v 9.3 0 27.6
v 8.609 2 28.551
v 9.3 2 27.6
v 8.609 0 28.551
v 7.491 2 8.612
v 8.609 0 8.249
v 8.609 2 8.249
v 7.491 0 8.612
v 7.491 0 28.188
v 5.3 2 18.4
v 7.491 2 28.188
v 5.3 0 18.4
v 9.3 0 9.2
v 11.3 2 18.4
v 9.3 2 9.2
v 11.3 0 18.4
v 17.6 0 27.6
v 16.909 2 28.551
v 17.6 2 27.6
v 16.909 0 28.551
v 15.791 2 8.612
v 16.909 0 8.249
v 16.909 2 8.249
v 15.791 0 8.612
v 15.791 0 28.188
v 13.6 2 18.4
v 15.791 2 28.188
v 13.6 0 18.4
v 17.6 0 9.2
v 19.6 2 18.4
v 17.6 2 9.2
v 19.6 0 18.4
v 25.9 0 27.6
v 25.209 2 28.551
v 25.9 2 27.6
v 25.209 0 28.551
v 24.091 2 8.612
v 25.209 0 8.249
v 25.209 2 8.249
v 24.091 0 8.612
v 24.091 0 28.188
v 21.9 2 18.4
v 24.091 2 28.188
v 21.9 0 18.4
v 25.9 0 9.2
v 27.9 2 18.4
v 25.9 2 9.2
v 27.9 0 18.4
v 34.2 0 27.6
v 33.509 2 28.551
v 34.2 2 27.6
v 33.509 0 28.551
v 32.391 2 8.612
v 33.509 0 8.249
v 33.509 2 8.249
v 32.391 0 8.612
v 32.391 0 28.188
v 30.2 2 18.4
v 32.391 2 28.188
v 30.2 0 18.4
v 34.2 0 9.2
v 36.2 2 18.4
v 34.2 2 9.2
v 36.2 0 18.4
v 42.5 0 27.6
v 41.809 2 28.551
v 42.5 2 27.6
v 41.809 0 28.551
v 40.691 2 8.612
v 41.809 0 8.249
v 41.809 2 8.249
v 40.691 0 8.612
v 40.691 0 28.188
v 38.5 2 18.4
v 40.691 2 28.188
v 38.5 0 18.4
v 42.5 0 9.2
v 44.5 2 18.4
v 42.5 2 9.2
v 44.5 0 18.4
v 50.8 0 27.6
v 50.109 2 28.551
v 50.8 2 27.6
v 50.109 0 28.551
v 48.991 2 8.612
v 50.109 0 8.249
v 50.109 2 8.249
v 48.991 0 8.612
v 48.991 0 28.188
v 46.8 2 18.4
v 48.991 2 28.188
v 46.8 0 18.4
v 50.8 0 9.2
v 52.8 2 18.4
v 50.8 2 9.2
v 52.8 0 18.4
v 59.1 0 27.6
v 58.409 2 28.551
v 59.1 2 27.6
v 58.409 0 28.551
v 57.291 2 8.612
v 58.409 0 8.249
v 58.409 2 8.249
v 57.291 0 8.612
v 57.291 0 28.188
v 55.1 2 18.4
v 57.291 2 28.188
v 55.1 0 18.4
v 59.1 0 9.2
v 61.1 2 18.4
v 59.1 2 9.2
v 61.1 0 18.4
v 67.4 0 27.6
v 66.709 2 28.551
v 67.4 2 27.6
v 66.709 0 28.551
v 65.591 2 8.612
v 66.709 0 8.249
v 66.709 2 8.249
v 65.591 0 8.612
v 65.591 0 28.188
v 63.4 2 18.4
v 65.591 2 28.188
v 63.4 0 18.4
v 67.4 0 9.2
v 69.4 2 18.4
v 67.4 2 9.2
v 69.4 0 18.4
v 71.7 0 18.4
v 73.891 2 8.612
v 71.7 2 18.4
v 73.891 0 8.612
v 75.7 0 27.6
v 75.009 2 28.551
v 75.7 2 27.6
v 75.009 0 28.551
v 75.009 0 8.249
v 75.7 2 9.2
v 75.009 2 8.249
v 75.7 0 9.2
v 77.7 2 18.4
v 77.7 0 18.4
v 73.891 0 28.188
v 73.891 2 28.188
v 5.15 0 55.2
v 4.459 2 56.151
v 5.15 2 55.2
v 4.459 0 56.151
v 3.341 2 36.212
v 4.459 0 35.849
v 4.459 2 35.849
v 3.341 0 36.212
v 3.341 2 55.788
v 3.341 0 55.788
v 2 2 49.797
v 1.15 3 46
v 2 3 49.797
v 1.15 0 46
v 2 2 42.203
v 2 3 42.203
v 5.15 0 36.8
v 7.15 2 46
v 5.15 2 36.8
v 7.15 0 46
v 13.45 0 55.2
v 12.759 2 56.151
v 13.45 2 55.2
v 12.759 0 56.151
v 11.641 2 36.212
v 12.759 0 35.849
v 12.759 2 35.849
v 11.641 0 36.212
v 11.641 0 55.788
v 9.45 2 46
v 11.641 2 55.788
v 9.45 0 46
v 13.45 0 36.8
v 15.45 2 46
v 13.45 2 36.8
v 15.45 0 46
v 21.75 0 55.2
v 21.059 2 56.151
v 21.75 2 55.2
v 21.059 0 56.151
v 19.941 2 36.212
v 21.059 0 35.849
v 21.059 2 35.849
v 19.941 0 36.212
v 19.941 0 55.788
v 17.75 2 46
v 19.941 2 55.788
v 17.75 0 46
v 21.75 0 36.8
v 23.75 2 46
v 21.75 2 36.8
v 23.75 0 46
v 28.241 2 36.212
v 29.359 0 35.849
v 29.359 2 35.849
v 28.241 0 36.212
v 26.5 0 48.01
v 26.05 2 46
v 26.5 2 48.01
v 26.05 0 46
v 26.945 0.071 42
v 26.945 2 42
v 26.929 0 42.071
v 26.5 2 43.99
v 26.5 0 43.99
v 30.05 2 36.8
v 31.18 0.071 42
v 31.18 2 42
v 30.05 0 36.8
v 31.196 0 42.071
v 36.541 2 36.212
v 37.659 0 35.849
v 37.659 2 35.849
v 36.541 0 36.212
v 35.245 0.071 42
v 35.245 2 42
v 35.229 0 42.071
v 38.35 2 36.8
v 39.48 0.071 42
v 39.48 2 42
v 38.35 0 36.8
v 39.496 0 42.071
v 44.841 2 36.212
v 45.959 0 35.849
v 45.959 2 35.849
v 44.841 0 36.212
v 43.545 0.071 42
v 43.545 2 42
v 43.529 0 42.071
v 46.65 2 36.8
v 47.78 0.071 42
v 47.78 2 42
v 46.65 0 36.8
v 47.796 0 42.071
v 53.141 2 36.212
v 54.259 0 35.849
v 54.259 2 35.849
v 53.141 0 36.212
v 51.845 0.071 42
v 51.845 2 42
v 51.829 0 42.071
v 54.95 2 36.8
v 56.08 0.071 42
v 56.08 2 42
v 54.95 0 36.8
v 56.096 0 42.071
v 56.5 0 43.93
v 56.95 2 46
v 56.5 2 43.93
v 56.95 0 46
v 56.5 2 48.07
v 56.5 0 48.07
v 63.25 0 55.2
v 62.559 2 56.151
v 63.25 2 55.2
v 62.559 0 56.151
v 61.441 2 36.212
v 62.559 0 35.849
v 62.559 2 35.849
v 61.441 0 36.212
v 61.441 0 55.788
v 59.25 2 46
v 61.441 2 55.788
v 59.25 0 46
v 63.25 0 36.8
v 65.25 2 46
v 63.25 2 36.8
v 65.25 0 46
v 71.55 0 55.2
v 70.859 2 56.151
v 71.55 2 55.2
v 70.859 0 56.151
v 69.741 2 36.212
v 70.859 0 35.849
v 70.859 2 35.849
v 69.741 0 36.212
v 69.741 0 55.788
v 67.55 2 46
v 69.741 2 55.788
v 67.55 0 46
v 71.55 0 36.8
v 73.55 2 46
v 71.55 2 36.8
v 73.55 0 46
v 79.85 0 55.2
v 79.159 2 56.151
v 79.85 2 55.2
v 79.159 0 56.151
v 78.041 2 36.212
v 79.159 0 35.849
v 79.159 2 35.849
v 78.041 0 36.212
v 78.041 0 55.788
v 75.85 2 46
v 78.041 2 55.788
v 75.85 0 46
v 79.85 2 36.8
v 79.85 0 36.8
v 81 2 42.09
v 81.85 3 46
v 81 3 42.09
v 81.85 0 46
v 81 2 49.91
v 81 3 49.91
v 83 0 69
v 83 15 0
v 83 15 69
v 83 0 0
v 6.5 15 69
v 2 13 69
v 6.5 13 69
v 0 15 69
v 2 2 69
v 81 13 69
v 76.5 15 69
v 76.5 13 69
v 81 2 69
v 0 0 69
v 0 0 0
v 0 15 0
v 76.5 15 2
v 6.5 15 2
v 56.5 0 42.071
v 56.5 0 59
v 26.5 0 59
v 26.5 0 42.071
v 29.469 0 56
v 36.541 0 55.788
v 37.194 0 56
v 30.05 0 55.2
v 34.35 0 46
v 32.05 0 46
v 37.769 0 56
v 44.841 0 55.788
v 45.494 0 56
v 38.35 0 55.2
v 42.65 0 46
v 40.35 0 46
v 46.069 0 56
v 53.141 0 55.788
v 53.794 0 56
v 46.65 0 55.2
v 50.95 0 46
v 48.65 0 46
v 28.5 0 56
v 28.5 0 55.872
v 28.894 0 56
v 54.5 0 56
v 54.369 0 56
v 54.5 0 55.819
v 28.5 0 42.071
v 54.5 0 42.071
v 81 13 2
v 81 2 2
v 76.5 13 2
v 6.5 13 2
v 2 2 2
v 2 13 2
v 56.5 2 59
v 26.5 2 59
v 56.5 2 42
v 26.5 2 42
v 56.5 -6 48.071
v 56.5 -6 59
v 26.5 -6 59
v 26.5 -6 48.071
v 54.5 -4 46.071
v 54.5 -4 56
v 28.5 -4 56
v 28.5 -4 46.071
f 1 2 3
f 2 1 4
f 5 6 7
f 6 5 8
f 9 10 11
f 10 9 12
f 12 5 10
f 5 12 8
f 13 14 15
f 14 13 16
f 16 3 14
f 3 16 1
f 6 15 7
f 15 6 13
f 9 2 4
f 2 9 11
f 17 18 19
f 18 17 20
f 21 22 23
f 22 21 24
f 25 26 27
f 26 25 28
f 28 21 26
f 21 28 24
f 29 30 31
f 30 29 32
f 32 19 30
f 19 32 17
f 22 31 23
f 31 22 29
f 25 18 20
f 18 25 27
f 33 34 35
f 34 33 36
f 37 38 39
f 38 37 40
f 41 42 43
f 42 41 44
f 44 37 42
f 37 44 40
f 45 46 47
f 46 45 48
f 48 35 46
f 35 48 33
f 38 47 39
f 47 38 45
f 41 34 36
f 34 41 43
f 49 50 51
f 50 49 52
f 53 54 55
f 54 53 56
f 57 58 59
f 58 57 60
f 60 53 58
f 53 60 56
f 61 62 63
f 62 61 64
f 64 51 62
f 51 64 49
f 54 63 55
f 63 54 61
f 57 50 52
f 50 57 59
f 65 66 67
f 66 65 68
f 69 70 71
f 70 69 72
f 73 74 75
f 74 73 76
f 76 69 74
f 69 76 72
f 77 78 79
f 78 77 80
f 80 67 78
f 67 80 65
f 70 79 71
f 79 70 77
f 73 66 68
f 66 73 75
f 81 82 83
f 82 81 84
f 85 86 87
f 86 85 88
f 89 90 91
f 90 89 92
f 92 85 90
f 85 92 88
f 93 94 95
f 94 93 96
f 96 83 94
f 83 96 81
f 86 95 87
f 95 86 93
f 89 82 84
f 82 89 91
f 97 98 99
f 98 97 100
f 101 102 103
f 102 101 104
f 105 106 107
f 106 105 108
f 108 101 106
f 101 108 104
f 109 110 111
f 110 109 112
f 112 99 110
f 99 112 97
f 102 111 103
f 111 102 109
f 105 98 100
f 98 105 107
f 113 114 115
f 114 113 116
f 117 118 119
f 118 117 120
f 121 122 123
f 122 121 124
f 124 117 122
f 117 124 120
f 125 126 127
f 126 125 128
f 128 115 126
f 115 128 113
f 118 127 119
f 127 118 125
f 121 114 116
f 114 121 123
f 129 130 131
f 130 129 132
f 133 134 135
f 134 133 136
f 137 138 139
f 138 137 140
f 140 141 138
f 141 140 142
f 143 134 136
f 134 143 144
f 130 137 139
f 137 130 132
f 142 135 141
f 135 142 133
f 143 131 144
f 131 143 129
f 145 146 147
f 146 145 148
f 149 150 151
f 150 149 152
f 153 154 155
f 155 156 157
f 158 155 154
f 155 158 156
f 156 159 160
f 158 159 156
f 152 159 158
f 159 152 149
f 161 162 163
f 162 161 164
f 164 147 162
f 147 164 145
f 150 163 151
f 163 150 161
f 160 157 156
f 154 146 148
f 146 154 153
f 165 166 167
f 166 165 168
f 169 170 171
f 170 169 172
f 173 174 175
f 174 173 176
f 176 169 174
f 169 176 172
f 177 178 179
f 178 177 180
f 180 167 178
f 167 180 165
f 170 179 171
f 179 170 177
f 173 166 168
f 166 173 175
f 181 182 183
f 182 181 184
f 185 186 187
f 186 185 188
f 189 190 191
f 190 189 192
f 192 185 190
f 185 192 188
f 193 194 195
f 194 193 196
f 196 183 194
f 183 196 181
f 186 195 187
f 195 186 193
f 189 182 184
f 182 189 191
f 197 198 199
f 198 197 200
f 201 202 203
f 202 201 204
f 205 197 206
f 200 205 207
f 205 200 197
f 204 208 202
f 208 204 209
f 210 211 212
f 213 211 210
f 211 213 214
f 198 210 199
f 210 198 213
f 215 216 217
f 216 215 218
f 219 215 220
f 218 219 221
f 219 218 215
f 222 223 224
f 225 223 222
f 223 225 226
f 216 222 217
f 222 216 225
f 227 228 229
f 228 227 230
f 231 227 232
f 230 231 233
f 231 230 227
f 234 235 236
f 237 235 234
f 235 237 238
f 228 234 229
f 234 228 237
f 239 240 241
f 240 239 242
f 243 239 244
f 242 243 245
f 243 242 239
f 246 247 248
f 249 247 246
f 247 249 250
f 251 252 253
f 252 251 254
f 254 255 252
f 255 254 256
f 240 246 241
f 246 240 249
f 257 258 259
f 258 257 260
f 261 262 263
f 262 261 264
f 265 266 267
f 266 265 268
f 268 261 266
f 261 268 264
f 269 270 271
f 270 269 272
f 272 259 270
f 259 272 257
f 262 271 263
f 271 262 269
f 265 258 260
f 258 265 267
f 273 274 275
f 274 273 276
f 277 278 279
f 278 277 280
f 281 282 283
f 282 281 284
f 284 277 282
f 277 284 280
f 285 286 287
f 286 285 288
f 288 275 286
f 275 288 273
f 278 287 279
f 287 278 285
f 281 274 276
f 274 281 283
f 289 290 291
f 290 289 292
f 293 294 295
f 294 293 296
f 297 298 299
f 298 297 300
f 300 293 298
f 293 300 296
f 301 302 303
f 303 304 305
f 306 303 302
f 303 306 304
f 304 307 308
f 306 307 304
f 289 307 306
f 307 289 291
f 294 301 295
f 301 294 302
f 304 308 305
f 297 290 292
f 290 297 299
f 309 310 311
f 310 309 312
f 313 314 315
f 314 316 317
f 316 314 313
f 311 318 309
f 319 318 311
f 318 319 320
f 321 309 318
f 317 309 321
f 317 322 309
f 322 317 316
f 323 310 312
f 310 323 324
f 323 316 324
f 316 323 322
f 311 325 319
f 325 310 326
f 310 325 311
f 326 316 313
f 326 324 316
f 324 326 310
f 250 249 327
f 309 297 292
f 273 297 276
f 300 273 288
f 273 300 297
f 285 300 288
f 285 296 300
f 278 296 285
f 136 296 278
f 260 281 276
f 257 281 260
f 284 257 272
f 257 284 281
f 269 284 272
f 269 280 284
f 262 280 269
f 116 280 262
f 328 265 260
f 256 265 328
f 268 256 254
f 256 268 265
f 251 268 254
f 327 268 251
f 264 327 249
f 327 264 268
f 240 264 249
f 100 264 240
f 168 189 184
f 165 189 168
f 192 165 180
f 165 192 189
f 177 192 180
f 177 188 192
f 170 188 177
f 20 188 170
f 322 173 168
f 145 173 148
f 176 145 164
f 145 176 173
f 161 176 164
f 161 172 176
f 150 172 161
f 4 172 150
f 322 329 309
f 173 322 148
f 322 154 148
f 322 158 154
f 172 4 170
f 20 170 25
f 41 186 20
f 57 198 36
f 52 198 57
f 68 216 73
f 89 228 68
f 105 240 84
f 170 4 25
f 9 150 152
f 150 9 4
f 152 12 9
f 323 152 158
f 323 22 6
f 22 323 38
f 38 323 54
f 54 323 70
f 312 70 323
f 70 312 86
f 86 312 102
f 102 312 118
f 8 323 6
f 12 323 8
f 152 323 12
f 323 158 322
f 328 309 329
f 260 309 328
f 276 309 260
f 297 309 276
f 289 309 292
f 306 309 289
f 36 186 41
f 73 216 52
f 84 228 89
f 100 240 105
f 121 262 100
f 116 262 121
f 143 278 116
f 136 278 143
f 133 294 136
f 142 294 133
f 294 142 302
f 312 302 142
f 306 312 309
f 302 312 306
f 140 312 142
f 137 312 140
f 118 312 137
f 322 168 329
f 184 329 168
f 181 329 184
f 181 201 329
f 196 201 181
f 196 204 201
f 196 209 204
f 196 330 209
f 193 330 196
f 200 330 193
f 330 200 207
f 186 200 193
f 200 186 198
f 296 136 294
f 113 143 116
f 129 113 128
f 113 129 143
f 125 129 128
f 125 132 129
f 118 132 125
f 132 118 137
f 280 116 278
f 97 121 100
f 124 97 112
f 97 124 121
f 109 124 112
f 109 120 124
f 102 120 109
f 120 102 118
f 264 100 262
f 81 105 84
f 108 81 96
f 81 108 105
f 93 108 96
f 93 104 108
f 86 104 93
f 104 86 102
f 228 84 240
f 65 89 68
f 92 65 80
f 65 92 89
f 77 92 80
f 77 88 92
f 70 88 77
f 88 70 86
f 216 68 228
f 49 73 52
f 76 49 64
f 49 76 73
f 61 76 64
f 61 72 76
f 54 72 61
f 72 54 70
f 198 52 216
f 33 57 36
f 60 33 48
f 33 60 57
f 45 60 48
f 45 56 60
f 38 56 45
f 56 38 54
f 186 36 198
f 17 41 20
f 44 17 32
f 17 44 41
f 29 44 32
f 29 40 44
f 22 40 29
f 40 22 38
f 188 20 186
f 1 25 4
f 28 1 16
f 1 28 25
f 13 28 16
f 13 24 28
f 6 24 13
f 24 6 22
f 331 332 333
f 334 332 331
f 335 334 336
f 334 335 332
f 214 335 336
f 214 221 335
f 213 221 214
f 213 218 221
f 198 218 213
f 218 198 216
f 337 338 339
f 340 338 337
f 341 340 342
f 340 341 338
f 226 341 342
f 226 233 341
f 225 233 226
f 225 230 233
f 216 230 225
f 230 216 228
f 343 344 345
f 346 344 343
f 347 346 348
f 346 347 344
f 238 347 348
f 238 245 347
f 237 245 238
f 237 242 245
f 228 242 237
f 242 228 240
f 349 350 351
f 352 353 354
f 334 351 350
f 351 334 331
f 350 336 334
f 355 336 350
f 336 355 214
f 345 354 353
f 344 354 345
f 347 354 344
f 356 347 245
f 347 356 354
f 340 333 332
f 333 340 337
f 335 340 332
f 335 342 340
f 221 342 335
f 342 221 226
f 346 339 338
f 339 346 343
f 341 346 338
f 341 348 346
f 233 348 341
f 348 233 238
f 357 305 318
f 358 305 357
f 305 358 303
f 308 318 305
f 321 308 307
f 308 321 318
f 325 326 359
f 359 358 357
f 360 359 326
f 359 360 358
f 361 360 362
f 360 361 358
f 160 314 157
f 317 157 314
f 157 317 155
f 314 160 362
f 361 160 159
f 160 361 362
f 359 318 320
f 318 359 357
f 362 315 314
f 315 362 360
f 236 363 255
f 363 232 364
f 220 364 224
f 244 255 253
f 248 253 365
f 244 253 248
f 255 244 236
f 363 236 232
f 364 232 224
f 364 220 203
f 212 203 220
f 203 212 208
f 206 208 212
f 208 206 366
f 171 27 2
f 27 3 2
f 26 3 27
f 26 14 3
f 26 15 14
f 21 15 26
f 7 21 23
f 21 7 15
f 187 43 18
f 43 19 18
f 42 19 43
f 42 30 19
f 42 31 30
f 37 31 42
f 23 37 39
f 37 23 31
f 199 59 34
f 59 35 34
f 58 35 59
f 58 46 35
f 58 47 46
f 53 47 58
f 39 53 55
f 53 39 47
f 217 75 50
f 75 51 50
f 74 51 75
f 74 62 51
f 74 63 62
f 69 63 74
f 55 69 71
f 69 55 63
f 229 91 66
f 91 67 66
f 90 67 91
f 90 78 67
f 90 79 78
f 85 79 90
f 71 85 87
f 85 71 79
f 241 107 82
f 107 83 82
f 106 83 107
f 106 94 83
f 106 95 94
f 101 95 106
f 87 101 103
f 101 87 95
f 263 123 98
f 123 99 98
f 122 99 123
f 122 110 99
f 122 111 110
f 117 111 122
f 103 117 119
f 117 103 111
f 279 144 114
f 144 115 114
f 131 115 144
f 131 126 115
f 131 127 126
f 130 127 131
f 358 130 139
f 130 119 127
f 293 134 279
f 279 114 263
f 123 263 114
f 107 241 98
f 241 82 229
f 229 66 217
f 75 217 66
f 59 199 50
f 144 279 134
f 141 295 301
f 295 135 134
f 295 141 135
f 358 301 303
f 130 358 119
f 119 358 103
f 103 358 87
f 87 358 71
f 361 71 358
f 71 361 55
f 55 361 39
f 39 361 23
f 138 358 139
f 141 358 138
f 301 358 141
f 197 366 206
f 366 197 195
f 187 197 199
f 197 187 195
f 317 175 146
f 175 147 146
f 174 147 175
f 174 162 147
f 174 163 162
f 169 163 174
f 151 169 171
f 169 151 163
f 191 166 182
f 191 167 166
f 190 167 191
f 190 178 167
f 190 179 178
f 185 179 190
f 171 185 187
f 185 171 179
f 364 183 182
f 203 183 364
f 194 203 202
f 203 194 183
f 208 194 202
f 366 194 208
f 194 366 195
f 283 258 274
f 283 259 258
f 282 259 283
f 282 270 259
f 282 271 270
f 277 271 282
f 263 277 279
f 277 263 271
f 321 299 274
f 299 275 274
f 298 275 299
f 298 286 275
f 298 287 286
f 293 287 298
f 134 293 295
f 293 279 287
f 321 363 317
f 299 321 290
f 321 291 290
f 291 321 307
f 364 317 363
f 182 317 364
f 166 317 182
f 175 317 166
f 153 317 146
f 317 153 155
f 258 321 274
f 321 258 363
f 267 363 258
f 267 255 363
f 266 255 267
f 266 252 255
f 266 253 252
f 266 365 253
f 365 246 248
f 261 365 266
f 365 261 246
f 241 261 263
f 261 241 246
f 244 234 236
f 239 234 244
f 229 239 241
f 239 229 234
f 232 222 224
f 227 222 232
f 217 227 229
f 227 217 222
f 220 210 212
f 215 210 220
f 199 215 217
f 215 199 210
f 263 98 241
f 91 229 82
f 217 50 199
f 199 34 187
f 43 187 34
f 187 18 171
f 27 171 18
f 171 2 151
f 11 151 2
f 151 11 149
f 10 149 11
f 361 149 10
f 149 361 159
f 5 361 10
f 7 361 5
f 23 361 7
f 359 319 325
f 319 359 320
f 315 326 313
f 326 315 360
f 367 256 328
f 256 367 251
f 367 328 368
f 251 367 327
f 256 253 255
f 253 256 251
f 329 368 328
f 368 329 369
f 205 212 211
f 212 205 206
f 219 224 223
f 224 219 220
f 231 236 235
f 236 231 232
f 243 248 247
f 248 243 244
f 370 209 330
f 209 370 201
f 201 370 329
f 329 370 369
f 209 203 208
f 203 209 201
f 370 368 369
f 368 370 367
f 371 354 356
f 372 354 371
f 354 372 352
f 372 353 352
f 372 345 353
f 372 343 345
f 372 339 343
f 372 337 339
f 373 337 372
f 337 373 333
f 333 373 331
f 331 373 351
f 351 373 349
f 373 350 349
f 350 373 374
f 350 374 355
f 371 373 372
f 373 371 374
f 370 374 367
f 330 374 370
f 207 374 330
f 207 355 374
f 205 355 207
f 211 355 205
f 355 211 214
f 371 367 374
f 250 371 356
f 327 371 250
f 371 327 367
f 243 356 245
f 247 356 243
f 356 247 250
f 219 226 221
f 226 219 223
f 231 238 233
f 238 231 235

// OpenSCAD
// Width of the phone when held in landscape (mm)
iPhoneWidth = 79;	
// Height of the phone when held in landscape (mm)	
iPhoneHeight = 90;
// Thickness of the phone (mm)
iPhoneDepth = 11; 
// Slots on Side (pick 2 for iphones)
slots = 0; // [1,2]	

/* [Hidden] */
mountThickness = 2; // How thick to make the base of the mount.

difference() {

// Main Box
	cube([iPhoneWidth+2*mountThickness,iPhoneDepth+2*mountThickness,3/4*(iPhoneHeight+mountThickness)]);
	translate([mountThickness,mountThickness,mountThickness]) cube([iPhoneWidth,iPhoneDepth,iPhoneHeight+mountThickness]);
	
// Front Cutout
	translate([6.5,iPhoneDepth+mountThickness-1,75])rotate([-90,0,0]) 
    cube([70, 73, 10]);
    //cylinder(r=iPhoneWidth/2-4,h=mountThickness+2);

// Dual Slot Logic
    if (slots==2) { 
		// Lightning Adpators
        hull (){
            translate([mountThickness/2,(iPhoneDepth+2*mountThickness)/2, (iPhoneHeight+mountThickness)/2-5]) rotate ([0,90,0]) cylinder(r=3,h=mountThickness+2, center=true);
            translate([mountThickness/2,(iPhoneDepth+2*mountThickness)/2, (iPhoneHeight+mountThickness)/2+5]) rotate ([0,90,0]) cylinder(r=3,h=mountThickness+2, center=true);
        }

		// Power Buttons
        hull () {
            translate([mountThickness/2,(iPhoneDepth+2*mountThickness)/2, mountThickness+4]) rotate ([0,90,0]) cylinder(r=3,h=mountThickness+2, center=true);
            translate([mountThickness/2,(iPhoneDepth+2*mountThickness)/2,mountThickness+14]) rotate ([0,90,0]) cylinder(r=3,h=mountThickness+2, center=true);
        }
    }

// Single Slot Logic
    if (slots==1) {
    hull () {
            translate([mountThickness/2,(iPhoneDepth+2*mountThickness)/2, mountThickness+4]) rotate ([0,90,0]) cylinder(r=3,h=mountThickness+2, center=true);
            translate([mountThickness/2,(iPhoneDepth+2*mountThickness)/2,iPhoneHeight*3/4-5]) rotate ([0,90,0]) cylinder(r=3,h=mountThickness+2, center=true);
        }

        hull () {
            translate([iPhoneWidth+mountThickness*1.5,(iPhoneDepth+2*mountThickness)/2, mountThickness+4]) rotate ([0,90,0]) cylinder(r=3,h=mountThickness+2, center=true);
            translate([iPhoneWidth+1.5*mountThickness,(iPhoneDepth+2*mountThickness)/2, iPhoneHeight*3/4-5]) rotate ([0,90,0]) cylinder(r=3,h=mountThickness+2, center=true);
        }
    }

// Expansion Slots
for (z = [.1,.2,.3,.4,.5,.6,.7,.8,.9]) {
	hull () {
	translate([(iPhoneWidth+2*mountThickness)*z,mountThickness/2, (iPhoneHeight+mountThickness)*.30]) rotate ([90,0,0]) cylinder(r=1,h=mountThickness+2, center=true);
		translate([(iPhoneWidth+2*mountThickness)*z,mountThickness/2, (iPhoneHeight+mountThickness)*.20]) rotate ([90,0,0]) cylinder(r=3,h=mountThickness+2, center=true);
		translate([(iPhoneWidth+2*mountThickness)*z,mountThickness/2, (iPhoneHeight+mountThickness)*.10]) rotate ([90,0,0]) cylinder(r=1,h=mountThickness+2, center=true);
	}
}

for (z = [.05,.15,.25,.35,.45,.55,.65,.75,.85,.95]) {
	hull () {
		translate([(iPhoneWidth+2*mountThickness)*z,mountThickness/2, (iPhoneHeight+mountThickness)*.6]) rotate ([90,0,0]) cylinder(r=1,h=mountThickness+2, center=true);
		translate([(iPhoneWidth+2*mountThickness)*z,mountThickness/2, (iPhoneHeight+mountThickness)*.5]) rotate ([90,0,0]) cylinder(r=3,h=mountThickness+2, center=true);
		translate([(iPhoneWidth+2*mountThickness)*z,mountThickness/2, (iPhoneHeight+mountThickness)*.4]) rotate ([90,0,0]) cylinder(r=1,h=mountThickness+2, center=true);
	}
}


}

// Repair Base
difference() {
		cube([iPhoneWidth+2*mountThickness-4,iPhoneDepth+2*mountThickness-4,iPhoneHeight+mountThickness-4]);
	translate([-2,-2,mountThickness]) cube([iPhoneWidth+2*mountThickness+4,iPhoneDepth+2*mountThickness+4,iPhoneHeight+mountThickness+4]);
}

// Mount Attachement
difference() {
	translate([(iPhoneWidth+2*mountThickness)/2-15,-6,iPhoneHeight/2-3]) cube([30,6+mountThickness,17]);
	translate([(iPhoneWidth+2*mountThickness)/2-13,-4,iPhoneHeight/2-4]) cube([26,4,15]);
	translate([(iPhoneWidth+2*mountThickness)/2-16,0,iPhoneHeight/2-10]) rotate([45,0,0]) cube([32,5,15]);
}
